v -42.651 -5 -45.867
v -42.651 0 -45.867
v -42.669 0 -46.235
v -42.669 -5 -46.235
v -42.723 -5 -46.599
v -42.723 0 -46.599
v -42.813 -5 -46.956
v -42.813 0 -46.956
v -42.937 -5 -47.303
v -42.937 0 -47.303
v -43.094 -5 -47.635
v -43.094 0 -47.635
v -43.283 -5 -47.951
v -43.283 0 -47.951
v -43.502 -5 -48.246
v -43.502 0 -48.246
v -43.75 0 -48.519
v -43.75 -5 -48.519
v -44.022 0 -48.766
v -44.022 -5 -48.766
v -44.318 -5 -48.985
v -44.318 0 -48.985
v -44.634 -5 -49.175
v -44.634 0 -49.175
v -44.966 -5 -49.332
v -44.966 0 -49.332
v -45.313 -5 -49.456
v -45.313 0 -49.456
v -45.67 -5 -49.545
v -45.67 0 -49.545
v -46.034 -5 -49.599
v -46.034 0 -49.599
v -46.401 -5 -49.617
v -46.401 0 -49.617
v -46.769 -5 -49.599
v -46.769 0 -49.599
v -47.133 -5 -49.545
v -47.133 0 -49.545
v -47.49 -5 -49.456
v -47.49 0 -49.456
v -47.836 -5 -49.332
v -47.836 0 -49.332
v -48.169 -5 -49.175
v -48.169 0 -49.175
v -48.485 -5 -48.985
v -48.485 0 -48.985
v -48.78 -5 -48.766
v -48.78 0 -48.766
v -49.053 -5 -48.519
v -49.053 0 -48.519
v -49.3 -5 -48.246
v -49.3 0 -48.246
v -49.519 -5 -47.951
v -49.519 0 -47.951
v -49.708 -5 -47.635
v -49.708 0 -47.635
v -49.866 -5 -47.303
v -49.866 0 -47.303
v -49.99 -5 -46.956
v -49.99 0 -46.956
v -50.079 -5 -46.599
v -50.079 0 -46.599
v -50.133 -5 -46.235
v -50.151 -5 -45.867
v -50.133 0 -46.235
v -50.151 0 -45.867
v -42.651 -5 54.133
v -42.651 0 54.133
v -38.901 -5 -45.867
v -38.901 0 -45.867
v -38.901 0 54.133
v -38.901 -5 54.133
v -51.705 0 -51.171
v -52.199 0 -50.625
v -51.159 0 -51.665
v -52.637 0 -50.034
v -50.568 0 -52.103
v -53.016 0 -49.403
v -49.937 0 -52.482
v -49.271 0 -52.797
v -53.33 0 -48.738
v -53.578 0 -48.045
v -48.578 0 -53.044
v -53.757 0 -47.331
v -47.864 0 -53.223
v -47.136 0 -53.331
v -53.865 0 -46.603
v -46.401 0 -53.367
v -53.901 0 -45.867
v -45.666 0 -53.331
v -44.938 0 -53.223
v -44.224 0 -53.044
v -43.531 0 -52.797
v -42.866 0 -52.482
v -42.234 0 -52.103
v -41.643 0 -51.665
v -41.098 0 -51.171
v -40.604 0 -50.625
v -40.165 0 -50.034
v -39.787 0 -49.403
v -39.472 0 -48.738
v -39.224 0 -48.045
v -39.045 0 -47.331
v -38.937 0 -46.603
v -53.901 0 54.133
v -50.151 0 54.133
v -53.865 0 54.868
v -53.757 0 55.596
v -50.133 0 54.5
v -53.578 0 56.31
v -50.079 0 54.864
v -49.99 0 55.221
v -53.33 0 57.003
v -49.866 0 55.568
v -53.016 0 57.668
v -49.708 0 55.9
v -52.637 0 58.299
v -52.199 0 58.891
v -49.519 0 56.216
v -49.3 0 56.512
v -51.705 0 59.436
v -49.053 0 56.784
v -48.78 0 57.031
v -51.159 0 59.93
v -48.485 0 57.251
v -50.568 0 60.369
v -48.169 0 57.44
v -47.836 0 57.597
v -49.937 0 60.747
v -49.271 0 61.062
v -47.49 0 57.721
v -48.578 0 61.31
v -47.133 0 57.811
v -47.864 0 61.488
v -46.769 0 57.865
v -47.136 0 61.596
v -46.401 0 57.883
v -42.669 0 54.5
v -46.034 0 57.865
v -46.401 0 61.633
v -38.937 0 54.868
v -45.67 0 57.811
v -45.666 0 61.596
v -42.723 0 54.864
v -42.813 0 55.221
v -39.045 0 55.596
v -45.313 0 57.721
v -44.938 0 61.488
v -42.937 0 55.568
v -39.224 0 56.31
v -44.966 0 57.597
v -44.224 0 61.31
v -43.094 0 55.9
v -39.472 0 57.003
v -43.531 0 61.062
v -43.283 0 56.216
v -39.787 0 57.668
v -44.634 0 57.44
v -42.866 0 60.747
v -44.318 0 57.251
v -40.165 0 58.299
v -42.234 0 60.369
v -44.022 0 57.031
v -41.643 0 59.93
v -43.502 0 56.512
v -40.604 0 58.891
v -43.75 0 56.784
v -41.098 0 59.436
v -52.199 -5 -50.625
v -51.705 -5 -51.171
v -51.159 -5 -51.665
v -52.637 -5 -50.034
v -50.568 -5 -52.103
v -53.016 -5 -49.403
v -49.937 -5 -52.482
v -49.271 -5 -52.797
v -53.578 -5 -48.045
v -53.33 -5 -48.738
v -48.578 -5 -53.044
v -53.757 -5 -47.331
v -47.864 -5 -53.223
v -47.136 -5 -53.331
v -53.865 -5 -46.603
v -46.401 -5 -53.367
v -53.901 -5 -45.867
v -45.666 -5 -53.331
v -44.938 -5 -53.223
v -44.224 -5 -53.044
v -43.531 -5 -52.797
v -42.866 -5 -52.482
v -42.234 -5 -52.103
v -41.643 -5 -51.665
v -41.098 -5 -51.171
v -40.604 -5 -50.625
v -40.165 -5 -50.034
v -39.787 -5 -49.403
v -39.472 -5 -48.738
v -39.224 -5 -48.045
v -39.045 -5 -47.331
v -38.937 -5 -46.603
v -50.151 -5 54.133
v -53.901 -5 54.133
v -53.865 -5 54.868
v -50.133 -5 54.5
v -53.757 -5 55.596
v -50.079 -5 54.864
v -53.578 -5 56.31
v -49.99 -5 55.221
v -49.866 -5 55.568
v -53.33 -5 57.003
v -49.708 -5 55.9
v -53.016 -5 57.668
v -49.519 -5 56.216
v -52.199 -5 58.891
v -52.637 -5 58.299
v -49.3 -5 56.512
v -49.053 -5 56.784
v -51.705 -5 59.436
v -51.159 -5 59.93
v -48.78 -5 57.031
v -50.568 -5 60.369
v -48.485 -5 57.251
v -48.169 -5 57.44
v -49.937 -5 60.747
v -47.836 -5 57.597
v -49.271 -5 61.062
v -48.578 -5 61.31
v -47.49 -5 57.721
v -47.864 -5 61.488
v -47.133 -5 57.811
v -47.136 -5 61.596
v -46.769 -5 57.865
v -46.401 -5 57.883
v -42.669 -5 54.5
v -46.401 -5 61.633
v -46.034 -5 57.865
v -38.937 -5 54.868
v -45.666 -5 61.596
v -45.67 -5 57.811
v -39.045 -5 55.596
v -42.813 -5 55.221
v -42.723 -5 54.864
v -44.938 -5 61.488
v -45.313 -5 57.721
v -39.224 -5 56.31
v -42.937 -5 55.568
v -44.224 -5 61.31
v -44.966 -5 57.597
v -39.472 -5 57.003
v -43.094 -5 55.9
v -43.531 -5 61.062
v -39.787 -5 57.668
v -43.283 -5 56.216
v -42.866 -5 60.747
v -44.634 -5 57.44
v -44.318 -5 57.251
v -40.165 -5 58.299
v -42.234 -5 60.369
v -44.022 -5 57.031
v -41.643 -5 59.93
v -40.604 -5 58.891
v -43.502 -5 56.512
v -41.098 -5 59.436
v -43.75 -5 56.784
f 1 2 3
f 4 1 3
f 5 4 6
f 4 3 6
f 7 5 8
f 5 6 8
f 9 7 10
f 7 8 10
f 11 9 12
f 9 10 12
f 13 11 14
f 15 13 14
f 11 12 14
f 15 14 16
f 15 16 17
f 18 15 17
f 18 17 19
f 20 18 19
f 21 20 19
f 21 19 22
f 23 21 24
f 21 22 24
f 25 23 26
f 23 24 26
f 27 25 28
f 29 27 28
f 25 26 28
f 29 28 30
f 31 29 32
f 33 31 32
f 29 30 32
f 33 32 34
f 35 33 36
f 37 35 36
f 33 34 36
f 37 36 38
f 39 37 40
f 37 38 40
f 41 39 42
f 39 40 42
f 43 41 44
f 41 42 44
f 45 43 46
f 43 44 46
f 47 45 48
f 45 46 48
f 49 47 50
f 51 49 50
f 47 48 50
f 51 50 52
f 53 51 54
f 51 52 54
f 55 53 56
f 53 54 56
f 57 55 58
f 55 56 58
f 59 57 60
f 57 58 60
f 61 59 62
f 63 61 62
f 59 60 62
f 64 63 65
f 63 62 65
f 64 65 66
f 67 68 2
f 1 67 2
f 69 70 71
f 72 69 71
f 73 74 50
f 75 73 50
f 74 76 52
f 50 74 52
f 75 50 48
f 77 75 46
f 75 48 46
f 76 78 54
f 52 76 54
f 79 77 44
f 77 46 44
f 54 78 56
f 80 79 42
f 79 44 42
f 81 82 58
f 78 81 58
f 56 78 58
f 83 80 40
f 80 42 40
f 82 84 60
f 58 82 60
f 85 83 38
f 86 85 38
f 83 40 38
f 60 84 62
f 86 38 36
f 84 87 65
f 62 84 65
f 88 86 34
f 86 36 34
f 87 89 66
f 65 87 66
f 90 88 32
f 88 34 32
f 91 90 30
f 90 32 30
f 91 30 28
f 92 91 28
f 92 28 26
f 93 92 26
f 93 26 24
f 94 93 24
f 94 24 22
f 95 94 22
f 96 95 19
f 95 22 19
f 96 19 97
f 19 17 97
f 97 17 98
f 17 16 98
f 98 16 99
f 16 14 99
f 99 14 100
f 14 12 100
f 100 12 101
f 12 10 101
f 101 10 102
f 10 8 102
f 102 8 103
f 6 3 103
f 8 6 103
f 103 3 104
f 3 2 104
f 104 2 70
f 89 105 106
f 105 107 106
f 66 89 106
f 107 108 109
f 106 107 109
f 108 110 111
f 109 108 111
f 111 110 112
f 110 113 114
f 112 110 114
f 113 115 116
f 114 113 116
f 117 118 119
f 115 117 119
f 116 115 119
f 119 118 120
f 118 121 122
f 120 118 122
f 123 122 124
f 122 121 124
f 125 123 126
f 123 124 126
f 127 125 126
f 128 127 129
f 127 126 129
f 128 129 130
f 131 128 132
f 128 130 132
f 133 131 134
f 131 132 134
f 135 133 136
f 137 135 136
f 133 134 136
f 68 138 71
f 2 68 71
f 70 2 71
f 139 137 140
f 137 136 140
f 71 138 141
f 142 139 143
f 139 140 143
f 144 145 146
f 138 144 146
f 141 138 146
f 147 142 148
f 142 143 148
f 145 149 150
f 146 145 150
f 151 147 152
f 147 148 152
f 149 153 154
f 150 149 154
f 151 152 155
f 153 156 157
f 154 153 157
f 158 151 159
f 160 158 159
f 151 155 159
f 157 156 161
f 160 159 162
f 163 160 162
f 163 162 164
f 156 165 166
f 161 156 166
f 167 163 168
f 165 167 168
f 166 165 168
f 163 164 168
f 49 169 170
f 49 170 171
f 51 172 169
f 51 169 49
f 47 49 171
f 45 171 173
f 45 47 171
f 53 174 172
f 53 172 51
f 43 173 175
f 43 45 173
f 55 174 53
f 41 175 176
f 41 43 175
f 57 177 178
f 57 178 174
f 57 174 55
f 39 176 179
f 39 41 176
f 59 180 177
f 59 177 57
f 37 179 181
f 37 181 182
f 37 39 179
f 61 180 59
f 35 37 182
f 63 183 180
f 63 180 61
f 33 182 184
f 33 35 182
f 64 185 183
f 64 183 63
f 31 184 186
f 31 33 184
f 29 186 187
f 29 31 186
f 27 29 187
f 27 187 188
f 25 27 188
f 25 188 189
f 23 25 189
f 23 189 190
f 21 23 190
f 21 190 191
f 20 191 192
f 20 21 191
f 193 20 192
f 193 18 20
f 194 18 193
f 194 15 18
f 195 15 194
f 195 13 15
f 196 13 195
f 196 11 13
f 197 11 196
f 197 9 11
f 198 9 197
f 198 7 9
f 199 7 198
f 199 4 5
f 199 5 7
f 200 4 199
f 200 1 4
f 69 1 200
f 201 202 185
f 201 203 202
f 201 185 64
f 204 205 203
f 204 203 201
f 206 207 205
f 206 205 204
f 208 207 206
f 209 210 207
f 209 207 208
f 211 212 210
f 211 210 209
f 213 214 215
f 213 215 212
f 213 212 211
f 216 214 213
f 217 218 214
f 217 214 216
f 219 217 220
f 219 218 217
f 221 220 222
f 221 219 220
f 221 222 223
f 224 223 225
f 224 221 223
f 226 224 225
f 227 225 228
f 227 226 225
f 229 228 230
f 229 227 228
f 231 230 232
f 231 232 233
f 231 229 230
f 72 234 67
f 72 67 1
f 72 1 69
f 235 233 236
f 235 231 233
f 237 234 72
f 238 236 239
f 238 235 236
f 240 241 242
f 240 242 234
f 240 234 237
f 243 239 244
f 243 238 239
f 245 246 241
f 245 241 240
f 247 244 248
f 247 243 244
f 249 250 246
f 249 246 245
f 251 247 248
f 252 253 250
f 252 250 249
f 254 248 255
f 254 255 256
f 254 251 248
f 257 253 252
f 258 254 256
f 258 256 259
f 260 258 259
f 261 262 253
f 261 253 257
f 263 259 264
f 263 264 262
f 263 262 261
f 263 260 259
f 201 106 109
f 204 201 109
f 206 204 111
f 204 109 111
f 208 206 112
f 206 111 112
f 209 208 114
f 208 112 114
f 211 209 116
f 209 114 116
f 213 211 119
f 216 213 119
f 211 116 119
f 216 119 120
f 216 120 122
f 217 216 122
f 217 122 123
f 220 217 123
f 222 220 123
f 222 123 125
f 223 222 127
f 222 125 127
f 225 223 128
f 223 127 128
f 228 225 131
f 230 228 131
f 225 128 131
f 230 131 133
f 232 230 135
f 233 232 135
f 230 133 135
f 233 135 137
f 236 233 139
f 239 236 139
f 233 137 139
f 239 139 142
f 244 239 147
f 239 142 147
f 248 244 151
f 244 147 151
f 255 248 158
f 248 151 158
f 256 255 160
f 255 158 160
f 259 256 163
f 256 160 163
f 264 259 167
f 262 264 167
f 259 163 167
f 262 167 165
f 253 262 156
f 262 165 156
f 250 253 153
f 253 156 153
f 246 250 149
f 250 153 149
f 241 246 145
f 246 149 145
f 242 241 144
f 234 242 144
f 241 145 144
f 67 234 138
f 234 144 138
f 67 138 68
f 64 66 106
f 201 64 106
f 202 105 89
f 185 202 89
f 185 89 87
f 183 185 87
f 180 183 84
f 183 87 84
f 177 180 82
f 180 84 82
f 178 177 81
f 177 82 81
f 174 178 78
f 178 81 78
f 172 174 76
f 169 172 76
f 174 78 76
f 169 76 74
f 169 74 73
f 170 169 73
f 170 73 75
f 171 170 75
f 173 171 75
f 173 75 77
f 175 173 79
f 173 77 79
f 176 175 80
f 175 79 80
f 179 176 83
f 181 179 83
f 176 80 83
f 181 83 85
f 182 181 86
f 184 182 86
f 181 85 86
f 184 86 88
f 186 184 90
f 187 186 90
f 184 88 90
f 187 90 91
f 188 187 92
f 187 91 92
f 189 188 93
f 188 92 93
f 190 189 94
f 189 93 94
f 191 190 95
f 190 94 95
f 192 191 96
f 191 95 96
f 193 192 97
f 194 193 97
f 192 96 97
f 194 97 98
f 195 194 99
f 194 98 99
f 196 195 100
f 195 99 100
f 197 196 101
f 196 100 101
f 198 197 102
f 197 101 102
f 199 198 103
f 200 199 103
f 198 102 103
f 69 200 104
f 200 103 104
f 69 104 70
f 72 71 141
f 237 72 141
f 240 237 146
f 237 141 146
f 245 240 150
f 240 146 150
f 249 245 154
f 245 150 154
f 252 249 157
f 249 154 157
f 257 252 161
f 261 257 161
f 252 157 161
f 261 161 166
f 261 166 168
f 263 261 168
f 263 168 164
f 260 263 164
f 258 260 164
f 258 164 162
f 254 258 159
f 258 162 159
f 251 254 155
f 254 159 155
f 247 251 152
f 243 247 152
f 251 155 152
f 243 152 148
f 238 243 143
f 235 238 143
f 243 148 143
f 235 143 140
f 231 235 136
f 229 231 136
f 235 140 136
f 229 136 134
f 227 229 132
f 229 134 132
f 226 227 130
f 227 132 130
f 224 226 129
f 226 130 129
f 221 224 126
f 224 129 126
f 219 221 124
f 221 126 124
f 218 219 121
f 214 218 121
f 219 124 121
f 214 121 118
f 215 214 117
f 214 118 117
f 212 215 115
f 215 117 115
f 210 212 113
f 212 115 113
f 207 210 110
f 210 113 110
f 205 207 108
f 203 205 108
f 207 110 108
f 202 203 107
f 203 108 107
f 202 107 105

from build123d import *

# Parameters (mm, degrees)
F1_DEPTH = 5


with BuildPart() as f1:
    # F0 (on Front) → F1 (new body)
    with BuildSketch(Plane.XZ):
        with BuildLine():
            ThreePointArc((-50.1512476802, 47.6373701122), (-52.8964382086, 50.3825606406), (-53.9012476802, 54.1325606406))
            Line((-53.9012476802, 54.1325606406), (-53.9012476802, -45.8674393594))
            ThreePointArc((-53.9012476802, -45.8674393594), (-52.8964382086, -42.1174393594), (-50.1512476802, -39.372248831))
            Line((-50.1512476802, -39.372248831), (-50.1512476802, 47.6373701122))
        make_face()
        with BuildLine():
            Line((-50.1512476802, 54.1325606406), (-53.9012476802, 54.1325606406))
            ThreePointArc((-53.9012476802, 54.1325606406), (-52.8964382086, 50.3825606406), (-50.1512476802, 47.6373701122))
            Line((-50.1512476802, 47.6373701122), (-50.1512476802, 54.1325606406))
        make_face()
        with BuildLine():
            ThreePointArc((-38.9012476802, 54.1325606406), (-46.4012476802, 61.6325606406), (-53.9012476802, 54.1325606406))
            Line((-53.9012476802, 54.1325606406), (-50.1512476802, 54.1325606406))
            ThreePointArc((-50.1512476802, 54.1325606406), (-46.4012476802, 57.8825606406), (-42.6512476802, 54.1325606406))
            Line((-42.6512476802, 54.1325606406), (-38.9012476802, 54.1325606406))
        make_face()
        with BuildLine():
            ThreePointArc((-42.6512476802, 47.6373701122), (-39.9060571518, 50.3825606406), (-38.9012476802, 54.1325606406))
            Line((-38.9012476802, 54.1325606406), (-42.6512476802, 54.1325606406))
            Line((-42.6512476802, 54.1325606406), (-42.6512476802, 47.6373701122))
        make_face()
        with BuildLine():
            Line((-38.9012476802, -45.8674393594), (-38.9012476802, 54.1325606406))
            ThreePointArc((-38.9012476802, 54.1325606406), (-39.9060571518, 50.3825606406), (-42.6512476802, 47.6373701122))
            Line((-42.6512476802, 47.6373701122), (-42.6512476802, -39.372248831))
            ThreePointArc((-42.6512476802, -39.372248831), (-39.9060571518, -42.1174393594), (-38.9012476802, -45.8674393594))
        make_face()
        with BuildLine():
            Line((-42.6512476802, -45.8674393594), (-38.9012476802, -45.8674393594))
            ThreePointArc((-38.9012476802, -45.8674393594), (-39.9060571518, -42.1174393594), (-42.6512476802, -39.372248831))
            Line((-42.6512476802, -39.372248831), (-42.6512476802, -45.8674393594))
        make_face()
        with BuildLine():
            Line((-50.1512476802, -45.8674393594), (-53.9012476802, -45.8674393594))
            ThreePointArc((-53.9012476802, -45.8674393594), (-46.4012476802, -53.3674393594), (-38.9012476802, -45.8674393594))
            Line((-38.9012476802, -45.8674393594), (-42.6512476802, -45.8674393594))
            ThreePointArc((-42.6512476802, -45.8674393594), (-46.4012476802, -49.6174393594), (-50.1512476802, -45.8674393594))
        make_face()
        with BuildLine():
            ThreePointArc((-50.1512476802, -39.372248831), (-52.8964382086, -42.1174393594), (-53.9012476802, -45.8674393594))
            Line((-53.9012476802, -45.8674393594), (-50.1512476802, -45.8674393594))
            Line((-50.1512476802, -45.8674393594), (-50.1512476802, -39.372248831))
        make_face()
    extrude(amount=F1_DEPTH)


solid = f1.part
